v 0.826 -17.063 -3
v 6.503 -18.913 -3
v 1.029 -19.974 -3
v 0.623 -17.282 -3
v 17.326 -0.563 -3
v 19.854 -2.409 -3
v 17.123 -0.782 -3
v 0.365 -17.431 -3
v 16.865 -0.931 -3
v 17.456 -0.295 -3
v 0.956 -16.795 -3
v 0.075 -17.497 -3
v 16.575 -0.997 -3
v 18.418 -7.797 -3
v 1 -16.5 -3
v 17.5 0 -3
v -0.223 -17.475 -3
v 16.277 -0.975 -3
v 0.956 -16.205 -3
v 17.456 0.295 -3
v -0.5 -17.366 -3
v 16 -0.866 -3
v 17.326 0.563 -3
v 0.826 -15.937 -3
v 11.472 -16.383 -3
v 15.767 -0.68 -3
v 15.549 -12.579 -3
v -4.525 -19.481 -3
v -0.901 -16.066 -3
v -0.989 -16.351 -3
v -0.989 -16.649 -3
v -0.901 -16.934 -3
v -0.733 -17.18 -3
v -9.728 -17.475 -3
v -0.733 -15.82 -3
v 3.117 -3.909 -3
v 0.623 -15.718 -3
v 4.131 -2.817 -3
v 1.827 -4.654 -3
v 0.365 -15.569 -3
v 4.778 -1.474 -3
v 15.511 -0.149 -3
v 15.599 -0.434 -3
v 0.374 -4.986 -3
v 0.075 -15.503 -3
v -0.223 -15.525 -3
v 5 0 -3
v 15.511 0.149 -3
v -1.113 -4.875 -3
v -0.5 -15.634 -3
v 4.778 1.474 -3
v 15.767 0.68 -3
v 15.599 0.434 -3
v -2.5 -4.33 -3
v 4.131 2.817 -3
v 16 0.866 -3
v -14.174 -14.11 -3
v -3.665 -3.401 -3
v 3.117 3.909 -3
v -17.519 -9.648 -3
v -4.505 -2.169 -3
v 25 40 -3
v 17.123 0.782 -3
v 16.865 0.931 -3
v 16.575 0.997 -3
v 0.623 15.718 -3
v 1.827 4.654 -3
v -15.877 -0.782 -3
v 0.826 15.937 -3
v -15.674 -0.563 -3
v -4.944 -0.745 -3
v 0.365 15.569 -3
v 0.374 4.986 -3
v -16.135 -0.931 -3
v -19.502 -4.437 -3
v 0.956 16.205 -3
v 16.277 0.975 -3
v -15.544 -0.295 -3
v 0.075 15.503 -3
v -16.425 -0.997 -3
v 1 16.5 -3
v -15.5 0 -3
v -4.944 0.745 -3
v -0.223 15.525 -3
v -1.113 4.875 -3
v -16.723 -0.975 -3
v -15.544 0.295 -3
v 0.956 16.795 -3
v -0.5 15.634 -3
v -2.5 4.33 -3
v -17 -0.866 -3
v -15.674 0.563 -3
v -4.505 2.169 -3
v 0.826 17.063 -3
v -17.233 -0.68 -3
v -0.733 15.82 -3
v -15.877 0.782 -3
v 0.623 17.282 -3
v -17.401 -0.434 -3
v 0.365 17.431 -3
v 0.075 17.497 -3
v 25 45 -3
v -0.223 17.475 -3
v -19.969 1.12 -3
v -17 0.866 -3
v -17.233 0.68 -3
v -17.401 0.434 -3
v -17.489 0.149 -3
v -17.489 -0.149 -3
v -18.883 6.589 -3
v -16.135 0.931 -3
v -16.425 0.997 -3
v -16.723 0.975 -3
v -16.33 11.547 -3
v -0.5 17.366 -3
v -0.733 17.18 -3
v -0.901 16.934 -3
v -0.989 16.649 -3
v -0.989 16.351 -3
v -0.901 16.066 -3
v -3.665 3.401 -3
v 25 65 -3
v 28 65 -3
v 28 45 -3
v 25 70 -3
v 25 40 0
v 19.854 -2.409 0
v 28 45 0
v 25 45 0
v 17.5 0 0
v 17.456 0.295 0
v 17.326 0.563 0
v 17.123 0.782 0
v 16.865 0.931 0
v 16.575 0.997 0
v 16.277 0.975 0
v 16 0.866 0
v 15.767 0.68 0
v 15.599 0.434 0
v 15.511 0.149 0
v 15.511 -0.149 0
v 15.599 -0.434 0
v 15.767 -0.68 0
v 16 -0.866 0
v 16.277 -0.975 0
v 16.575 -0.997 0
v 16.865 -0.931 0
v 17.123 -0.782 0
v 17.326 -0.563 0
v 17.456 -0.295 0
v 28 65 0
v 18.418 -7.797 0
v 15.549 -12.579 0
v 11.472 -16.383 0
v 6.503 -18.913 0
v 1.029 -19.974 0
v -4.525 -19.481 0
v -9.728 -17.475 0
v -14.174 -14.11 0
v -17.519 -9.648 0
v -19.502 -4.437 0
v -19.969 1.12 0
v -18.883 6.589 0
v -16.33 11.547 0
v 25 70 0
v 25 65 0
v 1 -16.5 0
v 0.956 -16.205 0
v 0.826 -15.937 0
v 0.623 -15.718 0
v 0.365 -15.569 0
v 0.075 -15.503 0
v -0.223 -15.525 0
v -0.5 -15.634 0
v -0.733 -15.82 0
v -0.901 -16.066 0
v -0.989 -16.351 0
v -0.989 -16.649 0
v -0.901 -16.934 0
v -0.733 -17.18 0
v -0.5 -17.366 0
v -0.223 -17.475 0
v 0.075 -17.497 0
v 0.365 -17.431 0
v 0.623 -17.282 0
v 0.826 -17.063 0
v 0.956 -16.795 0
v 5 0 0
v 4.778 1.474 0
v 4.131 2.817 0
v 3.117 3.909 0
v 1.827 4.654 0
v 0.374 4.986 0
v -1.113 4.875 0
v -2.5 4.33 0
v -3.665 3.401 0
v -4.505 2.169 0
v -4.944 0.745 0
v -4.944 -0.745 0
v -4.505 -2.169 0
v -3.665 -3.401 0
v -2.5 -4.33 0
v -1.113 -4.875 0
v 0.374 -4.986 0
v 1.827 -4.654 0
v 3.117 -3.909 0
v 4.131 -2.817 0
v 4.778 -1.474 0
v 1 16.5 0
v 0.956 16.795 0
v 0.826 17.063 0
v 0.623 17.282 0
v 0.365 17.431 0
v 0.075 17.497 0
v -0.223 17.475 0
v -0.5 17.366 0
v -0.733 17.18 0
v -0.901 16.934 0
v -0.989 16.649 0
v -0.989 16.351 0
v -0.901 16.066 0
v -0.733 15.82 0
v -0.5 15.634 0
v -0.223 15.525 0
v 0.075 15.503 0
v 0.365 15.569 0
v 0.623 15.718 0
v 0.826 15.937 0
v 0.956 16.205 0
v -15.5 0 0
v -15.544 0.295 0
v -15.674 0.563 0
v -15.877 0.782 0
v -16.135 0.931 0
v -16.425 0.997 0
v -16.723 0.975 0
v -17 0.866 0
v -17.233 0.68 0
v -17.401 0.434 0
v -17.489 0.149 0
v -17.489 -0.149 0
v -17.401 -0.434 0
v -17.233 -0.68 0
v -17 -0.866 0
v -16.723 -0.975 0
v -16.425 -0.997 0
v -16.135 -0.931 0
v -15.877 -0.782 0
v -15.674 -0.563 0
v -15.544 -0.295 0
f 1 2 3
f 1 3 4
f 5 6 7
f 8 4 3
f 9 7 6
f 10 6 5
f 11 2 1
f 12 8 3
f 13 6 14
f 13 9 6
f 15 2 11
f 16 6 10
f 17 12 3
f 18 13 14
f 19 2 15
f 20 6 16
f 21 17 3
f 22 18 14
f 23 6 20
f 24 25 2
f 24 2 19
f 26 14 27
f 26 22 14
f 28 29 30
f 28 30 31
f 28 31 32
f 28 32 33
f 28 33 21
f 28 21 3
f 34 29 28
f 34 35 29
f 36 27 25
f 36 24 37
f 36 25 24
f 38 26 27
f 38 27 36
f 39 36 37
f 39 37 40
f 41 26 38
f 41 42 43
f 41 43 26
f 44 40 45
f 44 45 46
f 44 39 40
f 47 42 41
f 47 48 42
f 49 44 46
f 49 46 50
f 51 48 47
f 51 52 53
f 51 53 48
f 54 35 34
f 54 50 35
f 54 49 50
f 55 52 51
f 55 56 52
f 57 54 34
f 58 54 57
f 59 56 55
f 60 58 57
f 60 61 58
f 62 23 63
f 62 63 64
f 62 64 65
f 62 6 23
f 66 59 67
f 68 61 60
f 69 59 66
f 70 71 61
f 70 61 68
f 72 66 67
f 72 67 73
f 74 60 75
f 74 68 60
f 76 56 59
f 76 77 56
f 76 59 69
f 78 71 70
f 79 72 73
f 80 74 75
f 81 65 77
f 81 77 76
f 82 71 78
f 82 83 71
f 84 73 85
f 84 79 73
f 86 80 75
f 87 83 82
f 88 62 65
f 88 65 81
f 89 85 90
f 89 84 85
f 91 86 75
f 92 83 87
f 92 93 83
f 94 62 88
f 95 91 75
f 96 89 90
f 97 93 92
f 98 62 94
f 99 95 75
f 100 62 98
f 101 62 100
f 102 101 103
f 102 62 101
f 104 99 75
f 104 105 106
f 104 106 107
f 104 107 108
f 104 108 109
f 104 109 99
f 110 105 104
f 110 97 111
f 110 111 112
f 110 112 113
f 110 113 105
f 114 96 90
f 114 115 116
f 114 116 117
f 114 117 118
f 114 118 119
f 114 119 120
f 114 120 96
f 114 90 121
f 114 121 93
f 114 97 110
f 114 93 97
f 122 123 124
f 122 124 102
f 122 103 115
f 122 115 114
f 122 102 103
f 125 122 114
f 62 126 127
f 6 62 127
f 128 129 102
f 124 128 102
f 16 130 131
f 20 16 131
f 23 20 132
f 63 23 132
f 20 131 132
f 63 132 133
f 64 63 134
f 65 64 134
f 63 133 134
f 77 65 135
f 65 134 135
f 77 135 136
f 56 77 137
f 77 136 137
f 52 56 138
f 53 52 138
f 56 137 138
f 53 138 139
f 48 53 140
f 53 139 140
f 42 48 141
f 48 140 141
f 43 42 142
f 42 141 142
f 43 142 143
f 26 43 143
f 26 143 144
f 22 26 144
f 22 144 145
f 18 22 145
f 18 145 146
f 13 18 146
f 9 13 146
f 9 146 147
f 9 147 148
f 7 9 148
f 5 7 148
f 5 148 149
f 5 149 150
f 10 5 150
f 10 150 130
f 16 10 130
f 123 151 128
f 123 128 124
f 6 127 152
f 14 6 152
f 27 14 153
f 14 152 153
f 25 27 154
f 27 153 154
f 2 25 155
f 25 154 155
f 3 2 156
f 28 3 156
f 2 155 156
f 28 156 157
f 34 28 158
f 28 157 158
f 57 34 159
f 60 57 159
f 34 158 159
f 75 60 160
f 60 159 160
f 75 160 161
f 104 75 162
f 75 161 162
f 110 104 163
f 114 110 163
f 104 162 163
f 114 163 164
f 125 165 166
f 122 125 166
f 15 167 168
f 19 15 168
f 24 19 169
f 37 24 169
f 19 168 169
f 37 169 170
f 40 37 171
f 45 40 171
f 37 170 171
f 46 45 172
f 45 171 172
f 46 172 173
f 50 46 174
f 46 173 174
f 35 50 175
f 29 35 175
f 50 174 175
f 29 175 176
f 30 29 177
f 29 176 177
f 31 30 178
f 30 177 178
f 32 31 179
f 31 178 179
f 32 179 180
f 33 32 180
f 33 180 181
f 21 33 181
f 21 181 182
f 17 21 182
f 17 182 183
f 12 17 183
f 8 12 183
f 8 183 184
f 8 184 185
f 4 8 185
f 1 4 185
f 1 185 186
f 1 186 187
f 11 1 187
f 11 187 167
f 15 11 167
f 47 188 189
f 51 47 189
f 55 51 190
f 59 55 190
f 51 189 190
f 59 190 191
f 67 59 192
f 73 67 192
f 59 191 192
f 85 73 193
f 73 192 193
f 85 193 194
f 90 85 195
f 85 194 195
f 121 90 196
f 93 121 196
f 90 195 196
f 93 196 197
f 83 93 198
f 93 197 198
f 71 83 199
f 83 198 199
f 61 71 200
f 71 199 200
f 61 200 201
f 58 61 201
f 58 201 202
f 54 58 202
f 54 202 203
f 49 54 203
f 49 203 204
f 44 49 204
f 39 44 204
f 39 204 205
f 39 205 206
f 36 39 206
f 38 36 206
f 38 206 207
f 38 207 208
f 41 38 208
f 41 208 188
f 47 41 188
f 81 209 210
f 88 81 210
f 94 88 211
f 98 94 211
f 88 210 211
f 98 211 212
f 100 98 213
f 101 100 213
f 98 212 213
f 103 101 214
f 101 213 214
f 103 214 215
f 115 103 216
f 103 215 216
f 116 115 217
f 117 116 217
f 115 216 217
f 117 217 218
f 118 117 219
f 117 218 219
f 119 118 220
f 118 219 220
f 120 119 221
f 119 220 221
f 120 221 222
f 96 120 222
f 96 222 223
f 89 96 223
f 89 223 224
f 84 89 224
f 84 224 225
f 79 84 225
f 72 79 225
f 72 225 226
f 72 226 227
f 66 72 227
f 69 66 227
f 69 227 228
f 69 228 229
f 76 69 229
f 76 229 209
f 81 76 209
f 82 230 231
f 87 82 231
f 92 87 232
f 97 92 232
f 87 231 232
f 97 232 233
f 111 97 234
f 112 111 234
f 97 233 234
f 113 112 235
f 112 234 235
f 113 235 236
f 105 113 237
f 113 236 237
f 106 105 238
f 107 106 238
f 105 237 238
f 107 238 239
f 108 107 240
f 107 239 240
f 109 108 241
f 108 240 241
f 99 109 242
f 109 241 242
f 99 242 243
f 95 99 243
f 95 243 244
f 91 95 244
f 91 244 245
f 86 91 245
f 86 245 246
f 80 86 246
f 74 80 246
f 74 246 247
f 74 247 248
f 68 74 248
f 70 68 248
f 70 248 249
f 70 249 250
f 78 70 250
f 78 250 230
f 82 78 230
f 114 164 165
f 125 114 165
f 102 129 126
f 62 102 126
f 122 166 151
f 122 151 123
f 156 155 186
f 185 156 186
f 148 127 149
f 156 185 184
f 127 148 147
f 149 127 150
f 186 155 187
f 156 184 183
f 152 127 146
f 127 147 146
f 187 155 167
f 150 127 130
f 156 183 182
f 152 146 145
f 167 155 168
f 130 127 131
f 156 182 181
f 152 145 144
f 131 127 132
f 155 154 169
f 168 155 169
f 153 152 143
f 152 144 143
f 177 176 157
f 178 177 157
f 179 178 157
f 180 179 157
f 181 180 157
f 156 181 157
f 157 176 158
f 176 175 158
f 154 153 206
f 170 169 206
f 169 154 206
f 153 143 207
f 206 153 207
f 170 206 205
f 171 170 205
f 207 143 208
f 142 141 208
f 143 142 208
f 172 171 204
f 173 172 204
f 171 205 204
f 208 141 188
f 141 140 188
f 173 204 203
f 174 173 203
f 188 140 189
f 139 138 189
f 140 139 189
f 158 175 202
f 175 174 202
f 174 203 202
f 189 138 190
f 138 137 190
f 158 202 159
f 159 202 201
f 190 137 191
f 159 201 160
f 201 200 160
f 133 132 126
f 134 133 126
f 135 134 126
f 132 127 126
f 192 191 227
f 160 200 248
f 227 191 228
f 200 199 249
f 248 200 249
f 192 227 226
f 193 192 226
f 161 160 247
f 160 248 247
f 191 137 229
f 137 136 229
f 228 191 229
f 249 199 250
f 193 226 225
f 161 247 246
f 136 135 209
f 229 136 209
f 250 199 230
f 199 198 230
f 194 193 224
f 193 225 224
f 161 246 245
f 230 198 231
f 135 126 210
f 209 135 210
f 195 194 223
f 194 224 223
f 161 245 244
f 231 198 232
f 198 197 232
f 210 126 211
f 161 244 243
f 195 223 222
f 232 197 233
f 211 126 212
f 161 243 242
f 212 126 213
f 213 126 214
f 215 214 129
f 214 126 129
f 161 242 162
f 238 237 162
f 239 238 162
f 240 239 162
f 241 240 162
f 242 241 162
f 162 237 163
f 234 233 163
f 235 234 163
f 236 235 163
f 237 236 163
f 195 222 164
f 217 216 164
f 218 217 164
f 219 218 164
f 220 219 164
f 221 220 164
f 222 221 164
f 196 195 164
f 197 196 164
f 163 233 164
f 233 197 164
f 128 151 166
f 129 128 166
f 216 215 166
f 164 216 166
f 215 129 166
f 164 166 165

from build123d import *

# Parameters (mm, degrees)
BOSS_EXTRUDE1_DEPTH = 3
SKETCH2_R           = 5
CUT_EXTRUDE1_DEPTH  = 10
SKETCH4_W           = 3
SKETCH4_H           = 20
BOSS_EXTRUDE3_DEPTH = 3
SKETCH5_R           = 1
CUT_EXTRUDE2_DEPTH  = 10


with BuildPart() as part:
    # Sketch1 → Boss-Extrude1 (new body)
    with BuildSketch(Plane.XY):
        with BuildLine():
            Line((-16.33027103, 11.546525368), (25, 70))
            Line((25, 70), (25, 40))
            Line((25, 40), (19.854388756, -2.408992972))
            ThreePointArc((19.854388756, -2.408992972), (-7.196803073, -18.660279353), (-16.33027103, 11.546525368))
        make_face()
    extrude(amount=-BOSS_EXTRUDE1_DEPTH)

    # Sketch2 → Cut-Extrude1 (cut)
    with BuildSketch(Plane.XY):
        Circle(SKETCH2_R)
    extrude(amount=-CUT_EXTRUDE1_DEPTH, mode=Mode.SUBTRACT)

    # Sketch4 → Boss-Extrude3 (add)
    with BuildSketch(Plane(origin=(25, 0, 0), x_dir=(0, 0, -1), z_dir=(1, 0, 0))):
        with Locations((1.5, 55)):
            Rectangle(SKETCH4_W, SKETCH4_H)
    extrude(amount=BOSS_EXTRUDE3_DEPTH)

    # Sketch5 → Cut-Extrude2 (cut)
    with BuildSketch(Plane.XY):
        with Locations((0, 16.5)):
            Circle(SKETCH5_R)
        with Locations((0, -16.5)):
            Circle(SKETCH5_R)
        with Locations((16.5, 0)):
            Circle(SKETCH5_R)
        with Locations((-16.5, 0)):
            Circle(SKETCH5_R)
    extrude(amount=-CUT_EXTRUDE2_DEPTH, mode=Mode.SUBTRACT)


solid = part.part
